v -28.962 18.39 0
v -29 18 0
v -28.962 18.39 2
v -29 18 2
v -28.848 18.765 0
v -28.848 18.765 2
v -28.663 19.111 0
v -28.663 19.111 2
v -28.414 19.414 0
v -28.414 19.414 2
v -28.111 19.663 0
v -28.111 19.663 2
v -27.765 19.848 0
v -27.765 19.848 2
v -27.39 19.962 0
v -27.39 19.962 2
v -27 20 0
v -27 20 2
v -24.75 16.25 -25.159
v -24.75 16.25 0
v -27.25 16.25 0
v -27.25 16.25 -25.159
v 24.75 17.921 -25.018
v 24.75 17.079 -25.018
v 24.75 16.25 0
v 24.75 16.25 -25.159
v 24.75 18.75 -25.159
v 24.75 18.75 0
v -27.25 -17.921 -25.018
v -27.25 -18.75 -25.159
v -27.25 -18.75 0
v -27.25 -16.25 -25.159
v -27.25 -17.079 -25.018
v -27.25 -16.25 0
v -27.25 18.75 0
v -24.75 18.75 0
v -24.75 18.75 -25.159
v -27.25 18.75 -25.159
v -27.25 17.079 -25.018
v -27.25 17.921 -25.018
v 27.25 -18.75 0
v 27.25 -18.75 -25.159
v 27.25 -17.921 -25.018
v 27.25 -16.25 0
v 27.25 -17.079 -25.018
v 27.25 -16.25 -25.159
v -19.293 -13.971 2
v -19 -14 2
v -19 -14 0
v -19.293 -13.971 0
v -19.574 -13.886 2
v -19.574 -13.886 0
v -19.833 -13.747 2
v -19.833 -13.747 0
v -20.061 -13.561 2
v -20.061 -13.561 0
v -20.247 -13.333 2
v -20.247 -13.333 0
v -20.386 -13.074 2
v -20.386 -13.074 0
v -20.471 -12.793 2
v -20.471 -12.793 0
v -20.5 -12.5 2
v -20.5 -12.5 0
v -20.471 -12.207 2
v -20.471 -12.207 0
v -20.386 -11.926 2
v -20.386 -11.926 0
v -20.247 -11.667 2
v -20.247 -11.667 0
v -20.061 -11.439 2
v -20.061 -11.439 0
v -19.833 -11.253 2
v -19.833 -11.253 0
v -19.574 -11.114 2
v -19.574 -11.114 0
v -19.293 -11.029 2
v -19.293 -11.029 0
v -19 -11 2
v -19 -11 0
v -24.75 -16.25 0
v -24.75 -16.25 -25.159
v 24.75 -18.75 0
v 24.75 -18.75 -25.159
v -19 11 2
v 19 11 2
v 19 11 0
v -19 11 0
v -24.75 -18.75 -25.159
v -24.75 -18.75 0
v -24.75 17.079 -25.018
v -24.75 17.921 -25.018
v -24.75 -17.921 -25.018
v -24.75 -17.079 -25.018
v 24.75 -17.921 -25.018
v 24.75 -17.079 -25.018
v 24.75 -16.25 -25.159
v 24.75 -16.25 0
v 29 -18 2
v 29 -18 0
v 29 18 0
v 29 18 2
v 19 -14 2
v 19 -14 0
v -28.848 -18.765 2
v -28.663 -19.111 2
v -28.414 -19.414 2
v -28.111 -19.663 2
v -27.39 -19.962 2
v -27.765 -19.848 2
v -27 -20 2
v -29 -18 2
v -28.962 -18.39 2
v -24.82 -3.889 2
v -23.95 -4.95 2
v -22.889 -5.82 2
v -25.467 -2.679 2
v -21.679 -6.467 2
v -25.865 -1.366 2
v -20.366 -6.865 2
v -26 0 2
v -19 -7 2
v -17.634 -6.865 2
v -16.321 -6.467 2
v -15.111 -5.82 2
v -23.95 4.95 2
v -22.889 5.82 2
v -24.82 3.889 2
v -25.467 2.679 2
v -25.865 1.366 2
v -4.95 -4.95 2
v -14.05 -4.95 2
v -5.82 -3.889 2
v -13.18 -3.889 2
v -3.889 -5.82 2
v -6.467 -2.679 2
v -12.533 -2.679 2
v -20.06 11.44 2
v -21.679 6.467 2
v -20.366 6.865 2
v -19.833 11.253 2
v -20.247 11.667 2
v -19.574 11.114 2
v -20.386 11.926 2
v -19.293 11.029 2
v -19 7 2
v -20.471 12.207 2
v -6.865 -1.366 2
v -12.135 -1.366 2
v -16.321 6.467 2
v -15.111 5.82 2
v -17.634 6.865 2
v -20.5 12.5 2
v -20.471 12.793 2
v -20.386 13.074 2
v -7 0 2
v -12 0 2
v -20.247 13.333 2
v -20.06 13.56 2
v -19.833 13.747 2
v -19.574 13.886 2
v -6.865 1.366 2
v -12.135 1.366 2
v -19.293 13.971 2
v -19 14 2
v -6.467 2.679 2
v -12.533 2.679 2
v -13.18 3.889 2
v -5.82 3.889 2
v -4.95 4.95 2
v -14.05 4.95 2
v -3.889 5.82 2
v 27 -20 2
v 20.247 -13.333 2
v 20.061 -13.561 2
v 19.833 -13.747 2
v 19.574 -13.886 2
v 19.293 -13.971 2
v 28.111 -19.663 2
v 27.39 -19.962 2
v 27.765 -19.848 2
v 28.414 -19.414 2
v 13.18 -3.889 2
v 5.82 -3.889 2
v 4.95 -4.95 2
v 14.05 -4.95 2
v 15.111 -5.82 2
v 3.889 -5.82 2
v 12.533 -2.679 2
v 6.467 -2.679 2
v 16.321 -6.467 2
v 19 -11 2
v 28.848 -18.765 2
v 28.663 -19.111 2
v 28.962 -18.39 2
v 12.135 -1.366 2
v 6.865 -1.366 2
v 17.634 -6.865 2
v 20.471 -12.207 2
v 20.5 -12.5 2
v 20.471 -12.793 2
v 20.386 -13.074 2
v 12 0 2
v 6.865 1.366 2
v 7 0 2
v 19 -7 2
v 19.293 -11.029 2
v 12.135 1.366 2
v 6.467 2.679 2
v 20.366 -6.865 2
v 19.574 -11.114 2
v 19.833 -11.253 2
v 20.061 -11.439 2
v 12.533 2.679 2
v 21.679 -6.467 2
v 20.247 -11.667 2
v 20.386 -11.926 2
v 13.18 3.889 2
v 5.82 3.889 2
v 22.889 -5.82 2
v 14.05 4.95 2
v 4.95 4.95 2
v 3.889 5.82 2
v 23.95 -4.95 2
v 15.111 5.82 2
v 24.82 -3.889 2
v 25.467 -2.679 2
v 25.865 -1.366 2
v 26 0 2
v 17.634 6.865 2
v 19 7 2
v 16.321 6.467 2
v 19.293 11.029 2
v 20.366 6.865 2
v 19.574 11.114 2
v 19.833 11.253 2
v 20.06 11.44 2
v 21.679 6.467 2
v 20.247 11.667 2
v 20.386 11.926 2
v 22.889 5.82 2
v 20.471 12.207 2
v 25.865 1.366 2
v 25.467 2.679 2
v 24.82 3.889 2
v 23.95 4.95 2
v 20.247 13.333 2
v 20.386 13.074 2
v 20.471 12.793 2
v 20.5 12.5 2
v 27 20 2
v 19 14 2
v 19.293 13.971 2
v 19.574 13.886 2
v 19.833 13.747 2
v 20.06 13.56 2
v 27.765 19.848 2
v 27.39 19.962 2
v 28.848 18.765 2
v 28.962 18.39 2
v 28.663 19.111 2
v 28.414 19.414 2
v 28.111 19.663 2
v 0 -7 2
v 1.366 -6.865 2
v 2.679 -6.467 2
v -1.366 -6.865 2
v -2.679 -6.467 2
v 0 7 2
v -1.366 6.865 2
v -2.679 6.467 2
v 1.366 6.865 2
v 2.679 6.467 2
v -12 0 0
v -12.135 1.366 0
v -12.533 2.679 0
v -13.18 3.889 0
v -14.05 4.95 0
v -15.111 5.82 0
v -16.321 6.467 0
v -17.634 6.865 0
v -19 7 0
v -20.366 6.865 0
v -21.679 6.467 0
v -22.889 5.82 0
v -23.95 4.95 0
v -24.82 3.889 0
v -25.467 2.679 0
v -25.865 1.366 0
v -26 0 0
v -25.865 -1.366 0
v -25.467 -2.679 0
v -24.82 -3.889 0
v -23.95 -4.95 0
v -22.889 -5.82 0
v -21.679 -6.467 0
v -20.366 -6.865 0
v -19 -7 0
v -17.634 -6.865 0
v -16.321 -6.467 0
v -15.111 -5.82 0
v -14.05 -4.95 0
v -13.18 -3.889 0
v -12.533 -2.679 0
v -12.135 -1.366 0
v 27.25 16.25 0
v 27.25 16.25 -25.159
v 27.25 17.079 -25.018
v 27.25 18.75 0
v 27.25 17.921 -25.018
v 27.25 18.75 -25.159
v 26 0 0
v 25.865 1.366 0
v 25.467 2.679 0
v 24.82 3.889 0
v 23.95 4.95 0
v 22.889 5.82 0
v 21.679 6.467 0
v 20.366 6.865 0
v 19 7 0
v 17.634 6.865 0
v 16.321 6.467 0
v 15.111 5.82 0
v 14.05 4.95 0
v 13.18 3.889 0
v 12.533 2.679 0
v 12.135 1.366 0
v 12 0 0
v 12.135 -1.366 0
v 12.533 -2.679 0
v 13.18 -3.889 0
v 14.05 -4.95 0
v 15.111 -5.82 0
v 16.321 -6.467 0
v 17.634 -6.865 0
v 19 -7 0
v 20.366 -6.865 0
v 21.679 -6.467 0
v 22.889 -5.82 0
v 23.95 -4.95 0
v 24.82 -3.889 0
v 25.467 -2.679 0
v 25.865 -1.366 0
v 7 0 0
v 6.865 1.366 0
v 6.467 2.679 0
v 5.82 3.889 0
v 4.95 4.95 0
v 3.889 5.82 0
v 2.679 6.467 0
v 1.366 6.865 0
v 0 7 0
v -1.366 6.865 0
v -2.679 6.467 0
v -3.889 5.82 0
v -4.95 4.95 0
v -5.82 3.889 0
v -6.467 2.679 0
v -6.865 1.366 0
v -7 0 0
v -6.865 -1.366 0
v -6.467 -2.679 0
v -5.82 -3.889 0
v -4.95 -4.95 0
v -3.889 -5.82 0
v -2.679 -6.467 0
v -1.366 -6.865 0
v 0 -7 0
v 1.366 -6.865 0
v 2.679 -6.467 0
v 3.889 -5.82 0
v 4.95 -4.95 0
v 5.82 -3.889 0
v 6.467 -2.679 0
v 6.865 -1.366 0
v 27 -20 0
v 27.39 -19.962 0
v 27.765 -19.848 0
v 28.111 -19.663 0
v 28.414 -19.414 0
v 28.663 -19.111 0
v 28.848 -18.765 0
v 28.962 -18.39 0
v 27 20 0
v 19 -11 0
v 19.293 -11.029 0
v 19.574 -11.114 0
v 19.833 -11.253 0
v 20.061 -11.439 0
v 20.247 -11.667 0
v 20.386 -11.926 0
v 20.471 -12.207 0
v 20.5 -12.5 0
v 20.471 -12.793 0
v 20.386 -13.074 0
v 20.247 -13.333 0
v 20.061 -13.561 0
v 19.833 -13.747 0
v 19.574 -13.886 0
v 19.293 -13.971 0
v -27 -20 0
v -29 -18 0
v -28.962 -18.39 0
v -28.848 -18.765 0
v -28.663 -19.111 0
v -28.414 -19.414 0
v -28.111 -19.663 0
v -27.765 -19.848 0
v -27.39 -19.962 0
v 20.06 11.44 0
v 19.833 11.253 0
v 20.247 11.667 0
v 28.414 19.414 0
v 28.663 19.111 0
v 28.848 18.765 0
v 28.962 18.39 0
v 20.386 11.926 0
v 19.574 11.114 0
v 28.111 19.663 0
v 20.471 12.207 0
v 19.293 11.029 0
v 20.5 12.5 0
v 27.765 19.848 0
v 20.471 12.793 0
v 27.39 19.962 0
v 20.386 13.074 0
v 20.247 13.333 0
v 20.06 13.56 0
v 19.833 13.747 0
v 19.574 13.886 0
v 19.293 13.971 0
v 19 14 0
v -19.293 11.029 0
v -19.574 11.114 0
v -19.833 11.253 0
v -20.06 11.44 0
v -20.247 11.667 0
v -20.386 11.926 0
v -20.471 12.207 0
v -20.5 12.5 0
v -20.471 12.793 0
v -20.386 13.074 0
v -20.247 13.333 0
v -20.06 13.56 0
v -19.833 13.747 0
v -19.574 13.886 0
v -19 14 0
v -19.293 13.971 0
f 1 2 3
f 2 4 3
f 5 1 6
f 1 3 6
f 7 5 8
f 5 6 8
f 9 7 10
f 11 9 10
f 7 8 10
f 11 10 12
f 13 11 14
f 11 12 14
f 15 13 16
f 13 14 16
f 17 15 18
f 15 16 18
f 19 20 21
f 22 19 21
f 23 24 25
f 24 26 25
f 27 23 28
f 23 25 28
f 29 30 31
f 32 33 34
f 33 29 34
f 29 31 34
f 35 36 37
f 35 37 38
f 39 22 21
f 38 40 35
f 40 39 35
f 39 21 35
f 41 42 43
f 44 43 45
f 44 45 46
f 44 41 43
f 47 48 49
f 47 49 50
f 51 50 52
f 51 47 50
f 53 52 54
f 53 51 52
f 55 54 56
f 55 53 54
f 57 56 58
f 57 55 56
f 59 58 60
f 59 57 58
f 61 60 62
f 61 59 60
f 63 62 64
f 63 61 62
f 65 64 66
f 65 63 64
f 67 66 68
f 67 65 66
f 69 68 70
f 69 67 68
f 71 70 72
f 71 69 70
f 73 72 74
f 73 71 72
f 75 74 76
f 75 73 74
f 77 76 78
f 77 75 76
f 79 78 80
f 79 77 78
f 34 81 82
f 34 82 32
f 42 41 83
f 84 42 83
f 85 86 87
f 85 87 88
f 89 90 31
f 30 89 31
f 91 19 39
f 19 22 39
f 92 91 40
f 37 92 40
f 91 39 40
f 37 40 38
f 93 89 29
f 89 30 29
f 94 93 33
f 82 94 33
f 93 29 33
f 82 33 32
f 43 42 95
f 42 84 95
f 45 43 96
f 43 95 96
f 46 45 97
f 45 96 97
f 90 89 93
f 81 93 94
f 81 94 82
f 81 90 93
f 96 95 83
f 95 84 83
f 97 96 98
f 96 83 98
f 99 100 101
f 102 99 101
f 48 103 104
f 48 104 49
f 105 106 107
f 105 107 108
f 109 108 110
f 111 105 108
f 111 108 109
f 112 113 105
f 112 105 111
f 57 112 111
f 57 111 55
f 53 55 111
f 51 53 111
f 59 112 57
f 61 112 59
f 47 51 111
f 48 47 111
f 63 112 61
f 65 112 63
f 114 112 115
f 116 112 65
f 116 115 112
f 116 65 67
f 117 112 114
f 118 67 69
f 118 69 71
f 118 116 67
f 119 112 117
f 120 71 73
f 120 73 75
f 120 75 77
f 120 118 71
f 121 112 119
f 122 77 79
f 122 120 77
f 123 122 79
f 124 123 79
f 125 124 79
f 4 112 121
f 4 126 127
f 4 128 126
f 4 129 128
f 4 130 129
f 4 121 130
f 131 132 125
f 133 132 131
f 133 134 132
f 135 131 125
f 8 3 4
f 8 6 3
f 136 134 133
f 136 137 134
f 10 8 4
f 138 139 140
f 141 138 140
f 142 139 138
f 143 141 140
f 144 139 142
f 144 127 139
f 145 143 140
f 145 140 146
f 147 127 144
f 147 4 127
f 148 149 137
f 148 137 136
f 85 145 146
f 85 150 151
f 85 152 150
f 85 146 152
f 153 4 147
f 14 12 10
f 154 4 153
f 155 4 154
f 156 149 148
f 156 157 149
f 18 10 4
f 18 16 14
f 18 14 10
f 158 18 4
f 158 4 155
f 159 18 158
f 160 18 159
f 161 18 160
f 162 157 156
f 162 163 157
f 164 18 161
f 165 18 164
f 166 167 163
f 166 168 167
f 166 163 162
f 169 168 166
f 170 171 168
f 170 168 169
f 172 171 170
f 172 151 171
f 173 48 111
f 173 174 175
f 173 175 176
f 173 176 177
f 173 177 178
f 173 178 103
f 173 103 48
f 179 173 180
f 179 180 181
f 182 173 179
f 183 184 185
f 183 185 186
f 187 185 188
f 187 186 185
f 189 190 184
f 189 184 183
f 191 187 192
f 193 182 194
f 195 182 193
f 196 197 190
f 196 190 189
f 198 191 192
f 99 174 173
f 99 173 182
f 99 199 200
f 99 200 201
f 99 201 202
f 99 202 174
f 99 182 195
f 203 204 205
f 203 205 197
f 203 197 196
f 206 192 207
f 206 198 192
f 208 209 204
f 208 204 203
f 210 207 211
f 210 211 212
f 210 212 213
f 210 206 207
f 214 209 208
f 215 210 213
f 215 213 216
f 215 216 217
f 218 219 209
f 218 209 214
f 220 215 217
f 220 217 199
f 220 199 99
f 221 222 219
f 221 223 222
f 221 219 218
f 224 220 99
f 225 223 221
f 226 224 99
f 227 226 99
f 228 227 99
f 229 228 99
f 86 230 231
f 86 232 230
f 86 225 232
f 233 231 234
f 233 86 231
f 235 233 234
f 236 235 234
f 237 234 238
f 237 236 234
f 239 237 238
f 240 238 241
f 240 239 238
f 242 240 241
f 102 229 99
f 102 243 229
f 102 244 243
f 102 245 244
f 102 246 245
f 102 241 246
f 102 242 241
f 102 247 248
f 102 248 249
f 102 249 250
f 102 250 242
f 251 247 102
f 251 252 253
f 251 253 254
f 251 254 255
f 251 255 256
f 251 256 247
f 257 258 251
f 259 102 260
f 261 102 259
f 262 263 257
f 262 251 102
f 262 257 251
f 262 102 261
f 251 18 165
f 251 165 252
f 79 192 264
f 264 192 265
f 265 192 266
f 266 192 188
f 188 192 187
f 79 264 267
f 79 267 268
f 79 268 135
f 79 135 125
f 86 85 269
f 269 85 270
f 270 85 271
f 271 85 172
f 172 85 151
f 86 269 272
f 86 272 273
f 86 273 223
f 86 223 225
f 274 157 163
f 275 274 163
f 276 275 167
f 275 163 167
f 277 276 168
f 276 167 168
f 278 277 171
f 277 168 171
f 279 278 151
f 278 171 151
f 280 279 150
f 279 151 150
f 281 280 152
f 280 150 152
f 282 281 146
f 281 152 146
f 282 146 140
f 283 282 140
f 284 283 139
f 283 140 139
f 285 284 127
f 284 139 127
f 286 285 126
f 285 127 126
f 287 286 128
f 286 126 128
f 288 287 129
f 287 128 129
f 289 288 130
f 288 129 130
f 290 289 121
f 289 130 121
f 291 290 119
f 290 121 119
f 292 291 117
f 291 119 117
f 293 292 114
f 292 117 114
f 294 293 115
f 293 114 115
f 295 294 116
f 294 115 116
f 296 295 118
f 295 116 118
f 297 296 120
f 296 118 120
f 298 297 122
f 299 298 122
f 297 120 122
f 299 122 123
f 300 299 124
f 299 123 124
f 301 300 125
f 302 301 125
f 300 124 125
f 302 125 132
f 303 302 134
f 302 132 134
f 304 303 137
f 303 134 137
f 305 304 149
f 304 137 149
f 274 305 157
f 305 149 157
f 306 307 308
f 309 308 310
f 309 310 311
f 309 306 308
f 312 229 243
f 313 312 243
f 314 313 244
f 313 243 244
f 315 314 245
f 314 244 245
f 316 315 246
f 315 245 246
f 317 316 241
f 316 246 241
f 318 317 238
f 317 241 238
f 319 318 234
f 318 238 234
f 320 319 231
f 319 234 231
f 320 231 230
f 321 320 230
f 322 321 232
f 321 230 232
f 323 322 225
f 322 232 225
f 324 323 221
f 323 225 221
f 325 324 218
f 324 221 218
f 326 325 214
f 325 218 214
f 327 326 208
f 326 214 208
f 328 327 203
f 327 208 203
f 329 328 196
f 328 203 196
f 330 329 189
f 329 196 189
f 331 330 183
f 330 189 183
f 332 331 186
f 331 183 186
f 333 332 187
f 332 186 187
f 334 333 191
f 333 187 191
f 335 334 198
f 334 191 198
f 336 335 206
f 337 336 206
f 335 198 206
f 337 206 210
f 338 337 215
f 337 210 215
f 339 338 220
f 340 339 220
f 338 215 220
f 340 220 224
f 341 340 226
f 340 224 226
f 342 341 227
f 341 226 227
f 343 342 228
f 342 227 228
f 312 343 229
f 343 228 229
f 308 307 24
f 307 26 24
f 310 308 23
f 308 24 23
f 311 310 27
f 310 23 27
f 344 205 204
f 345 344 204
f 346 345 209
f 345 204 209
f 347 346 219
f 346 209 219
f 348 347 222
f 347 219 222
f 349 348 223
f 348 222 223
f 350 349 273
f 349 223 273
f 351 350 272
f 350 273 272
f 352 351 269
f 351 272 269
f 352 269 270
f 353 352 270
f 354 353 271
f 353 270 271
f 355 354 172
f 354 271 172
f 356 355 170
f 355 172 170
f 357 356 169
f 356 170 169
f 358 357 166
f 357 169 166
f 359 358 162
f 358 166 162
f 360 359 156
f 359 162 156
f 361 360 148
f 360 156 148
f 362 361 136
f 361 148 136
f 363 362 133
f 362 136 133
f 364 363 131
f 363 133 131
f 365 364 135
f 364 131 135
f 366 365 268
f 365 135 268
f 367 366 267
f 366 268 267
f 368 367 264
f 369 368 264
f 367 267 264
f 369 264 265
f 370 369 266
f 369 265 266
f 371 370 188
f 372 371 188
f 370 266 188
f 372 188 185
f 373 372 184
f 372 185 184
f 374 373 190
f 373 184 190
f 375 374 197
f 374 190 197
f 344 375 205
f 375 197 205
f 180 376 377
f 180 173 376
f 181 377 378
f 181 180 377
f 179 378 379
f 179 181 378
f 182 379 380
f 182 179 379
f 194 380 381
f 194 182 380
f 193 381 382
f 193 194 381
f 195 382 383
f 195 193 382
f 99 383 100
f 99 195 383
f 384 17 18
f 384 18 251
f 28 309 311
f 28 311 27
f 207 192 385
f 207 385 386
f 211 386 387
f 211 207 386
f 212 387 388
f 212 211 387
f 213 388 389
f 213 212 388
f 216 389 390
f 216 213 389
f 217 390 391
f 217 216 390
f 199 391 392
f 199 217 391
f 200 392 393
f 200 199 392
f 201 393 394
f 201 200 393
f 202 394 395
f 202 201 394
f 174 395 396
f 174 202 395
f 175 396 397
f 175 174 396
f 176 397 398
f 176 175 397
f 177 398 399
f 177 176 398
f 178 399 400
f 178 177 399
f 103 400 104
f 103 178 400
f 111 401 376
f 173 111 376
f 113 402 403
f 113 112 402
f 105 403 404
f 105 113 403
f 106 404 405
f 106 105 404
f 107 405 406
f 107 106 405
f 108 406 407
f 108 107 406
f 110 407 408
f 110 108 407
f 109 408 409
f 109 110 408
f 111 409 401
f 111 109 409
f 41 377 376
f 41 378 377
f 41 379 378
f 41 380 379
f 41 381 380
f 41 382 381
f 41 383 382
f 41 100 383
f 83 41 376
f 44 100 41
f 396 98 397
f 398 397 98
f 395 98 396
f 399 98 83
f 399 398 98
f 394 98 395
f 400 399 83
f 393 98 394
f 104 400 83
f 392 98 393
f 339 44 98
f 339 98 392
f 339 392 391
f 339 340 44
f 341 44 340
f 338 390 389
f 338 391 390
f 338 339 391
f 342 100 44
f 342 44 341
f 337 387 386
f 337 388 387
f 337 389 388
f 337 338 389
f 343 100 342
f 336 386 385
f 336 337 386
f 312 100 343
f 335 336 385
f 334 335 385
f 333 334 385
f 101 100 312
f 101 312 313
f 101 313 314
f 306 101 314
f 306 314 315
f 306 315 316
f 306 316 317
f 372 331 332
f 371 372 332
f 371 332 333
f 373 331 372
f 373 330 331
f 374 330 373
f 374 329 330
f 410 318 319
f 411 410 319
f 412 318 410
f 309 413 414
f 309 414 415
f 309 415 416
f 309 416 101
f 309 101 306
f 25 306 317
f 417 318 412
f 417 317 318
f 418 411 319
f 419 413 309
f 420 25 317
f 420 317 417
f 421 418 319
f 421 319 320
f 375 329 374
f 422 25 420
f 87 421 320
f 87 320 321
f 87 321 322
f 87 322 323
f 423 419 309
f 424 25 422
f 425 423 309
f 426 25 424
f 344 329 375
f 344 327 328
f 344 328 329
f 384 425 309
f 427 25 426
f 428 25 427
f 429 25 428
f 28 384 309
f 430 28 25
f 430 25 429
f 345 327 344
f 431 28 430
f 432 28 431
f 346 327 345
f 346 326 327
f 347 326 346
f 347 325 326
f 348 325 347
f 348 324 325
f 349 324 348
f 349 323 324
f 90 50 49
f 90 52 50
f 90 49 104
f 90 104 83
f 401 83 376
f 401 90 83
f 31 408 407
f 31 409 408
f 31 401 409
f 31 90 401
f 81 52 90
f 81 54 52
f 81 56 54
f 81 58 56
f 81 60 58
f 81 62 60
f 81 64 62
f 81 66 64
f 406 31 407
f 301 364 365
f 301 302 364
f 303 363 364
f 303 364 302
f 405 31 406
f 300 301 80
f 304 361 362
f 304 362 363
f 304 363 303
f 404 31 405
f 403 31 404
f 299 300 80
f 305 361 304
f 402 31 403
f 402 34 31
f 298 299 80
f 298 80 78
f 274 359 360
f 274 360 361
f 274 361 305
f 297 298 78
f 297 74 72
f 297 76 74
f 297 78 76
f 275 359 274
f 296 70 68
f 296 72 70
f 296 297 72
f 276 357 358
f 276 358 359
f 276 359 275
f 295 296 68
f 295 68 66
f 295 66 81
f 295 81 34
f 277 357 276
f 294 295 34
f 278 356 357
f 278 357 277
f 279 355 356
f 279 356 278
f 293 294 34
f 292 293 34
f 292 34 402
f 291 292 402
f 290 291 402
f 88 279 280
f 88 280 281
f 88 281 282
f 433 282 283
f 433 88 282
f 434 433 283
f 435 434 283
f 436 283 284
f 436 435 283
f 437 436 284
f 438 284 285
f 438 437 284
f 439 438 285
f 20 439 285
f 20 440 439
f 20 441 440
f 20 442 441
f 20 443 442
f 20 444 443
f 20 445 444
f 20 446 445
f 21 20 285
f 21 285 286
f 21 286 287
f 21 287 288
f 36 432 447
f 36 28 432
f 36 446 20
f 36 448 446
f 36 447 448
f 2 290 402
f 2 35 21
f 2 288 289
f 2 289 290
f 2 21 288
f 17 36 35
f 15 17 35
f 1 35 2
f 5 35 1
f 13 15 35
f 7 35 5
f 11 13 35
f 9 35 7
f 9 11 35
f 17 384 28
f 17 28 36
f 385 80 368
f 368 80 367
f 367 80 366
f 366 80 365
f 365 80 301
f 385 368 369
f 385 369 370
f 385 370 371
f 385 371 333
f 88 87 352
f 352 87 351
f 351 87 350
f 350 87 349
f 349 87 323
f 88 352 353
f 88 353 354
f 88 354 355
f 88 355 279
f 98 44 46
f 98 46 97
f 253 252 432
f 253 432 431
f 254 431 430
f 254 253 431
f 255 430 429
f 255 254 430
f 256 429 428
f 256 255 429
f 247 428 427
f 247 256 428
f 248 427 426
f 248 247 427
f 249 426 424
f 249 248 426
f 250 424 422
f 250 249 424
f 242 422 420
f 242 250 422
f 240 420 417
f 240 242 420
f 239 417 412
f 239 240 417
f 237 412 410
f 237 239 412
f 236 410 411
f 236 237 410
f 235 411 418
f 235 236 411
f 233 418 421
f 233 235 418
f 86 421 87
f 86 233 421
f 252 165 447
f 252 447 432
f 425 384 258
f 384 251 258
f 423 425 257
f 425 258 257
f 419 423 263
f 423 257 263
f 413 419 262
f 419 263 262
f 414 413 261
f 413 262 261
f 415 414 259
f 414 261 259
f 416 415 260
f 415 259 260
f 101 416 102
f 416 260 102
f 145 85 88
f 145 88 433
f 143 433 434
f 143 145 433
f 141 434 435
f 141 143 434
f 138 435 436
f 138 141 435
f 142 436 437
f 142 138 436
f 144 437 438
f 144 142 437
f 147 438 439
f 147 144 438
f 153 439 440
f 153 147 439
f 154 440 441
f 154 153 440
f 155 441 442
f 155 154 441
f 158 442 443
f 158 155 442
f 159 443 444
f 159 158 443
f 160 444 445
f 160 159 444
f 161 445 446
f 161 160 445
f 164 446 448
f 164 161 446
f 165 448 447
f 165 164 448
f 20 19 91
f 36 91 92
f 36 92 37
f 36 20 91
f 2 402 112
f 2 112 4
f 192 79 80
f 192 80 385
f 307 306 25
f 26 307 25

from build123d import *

# Parameters (mm, degrees)
SKETCH1_W           = 58
SKETCH1_H           = 40
BOSS_EXTRUDE2_DEPTH = 2
SKETCH2_R           = 7
CUT_EXTRUDE1_DEPTH  = 2
FILLET1_R           = 2
SKETCH4_R           = 2.5
CUT_EXTRUDE5_DEPTH  = 2
SKETCH6_R           = 2.5
BOSS_EXTRUDE3_DEPTH = 2
SKETCH7_W           = 2.5
SKETCH7_H           = 2.5
BOSS_EXTRUDE5_DEPTH = 30
SKETCH8_R           = 5
CUT_EXTRUDE6_DEPTH  = 66


with BuildPart() as part:
    # Sketch1 → Boss-Extrude2 (new body)
    with BuildSketch(Plane.XY):
        Rectangle(SKETCH1_W, SKETCH1_H)
    extrude(amount=BOSS_EXTRUDE2_DEPTH)

    # Sketch2 → Cut-Extrude1 (cut)
    with BuildSketch(Plane.XY.offset(2)):
        Circle(SKETCH2_R)
        with Locations((19, 0)):
            Circle(SKETCH2_R)
        with Locations((-19, 0)):
            Circle(SKETCH2_R)
        with BuildLine():
            Line((-19, 13.999747299), (19, 13.999747299))
            ThreePointArc((19, 13.999747299), (20.499747299, 12.5), (19, 11.000252701))
            Line((19, 11.000252701), (-19, 11.000252701))
            ThreePointArc((-19, 11.000252701), (-20.499747299, 12.5), (-19, 13.999747299))
        make_face()
        with BuildLine():
            Line((-19, -10.99999193), (19, -10.99999193))
            ThreePointArc((19, -10.99999193), (20.50000807, -12.5), (19, -14.00000807))
            Line((19, -14.00000807), (-19, -14.00000807))
            ThreePointArc((-19, -14.00000807), (-20.50000807, -12.5), (-19, -10.99999193))
        make_face()
    extrude(amount=-CUT_EXTRUDE1_DEPTH, mode=Mode.SUBTRACT)

    # Fillet1
    fillet1_edges = [part.edges().sort_by_distance(p)[0] for p in [
        (29, -20, 1),
        (-29, -20, 1),
        (-29, 20, 1),
        (29, 20, 1),
    ]]
    fillet(fillet1_edges, radius=FILLET1_R)

    # Sketch4 → Cut-Extrude5 (cut)
    with BuildSketch(Plane(origin=(0, 0, 0), x_dir=(-1, 0, 0), z_dir=(0, 0, -1))):
        with Locations((25.5, 12.5)):
            Circle(SKETCH4_R)
        with Locations(Location((25.5, -12.5, 0), (0, 0, 180))):
            Circle(SKETCH4_R)
        with Locations((-25.5, -12.5)):
            Circle(SKETCH4_R)
        with Locations(Location((-25.5, 12.5, 0), (0, 0, 180))):
            Circle(SKETCH4_R)
    extrude(amount=-CUT_EXTRUDE5_DEPTH, mode=Mode.SUBTRACT)

    # Sketch6 → Boss-Extrude3 (add)
    with BuildSketch(Plane(origin=(0, 0, 0), x_dir=(-1, 0, 0), z_dir=(0, 0, -1))):
        with Locations((25.5, 12.5)):
            Circle(SKETCH6_R)
        with Locations((25.5, -12.5)):
            Circle(SKETCH6_R)
        with Locations((-25.5, -12.5)):
            Circle(SKETCH6_R)
        with Locations((-25.5, 12.5)):
            Circle(SKETCH6_R)
    extrude(amount=-BOSS_EXTRUDE3_DEPTH)

    # Sketch7 → Boss-Extrude5 (add)
    with BuildSketch(Plane(origin=(0, 0, 0), x_dir=(-1, 0, 0), z_dir=(0, 0, -1))):
        with Locations((-26, 17.5)):
            Rectangle(SKETCH7_W, SKETCH7_H)
        with Locations((-26, -17.5)):
            Rectangle(SKETCH7_W, SKETCH7_H)
        with Locations((26, -17.5)):
            Rectangle(SKETCH7_W, SKETCH7_H)
        with Locations((26, 17.5)):
            Rectangle(SKETCH7_W, SKETCH7_H)
    extrude(amount=BOSS_EXTRUDE5_DEPTH)

    # Sketch8 → Cut-Extrude6 (cut)
    with BuildSketch(Plane.ZY.offset(27.25)):
        with Locations((-30, 17.5)):
            Circle(SKETCH8_R)
        with Locations((-30, -17.5)):
            Circle(SKETCH8_R)
    extrude(amount=-CUT_EXTRUDE6_DEPTH, mode=Mode.SUBTRACT)


solid = part.part
